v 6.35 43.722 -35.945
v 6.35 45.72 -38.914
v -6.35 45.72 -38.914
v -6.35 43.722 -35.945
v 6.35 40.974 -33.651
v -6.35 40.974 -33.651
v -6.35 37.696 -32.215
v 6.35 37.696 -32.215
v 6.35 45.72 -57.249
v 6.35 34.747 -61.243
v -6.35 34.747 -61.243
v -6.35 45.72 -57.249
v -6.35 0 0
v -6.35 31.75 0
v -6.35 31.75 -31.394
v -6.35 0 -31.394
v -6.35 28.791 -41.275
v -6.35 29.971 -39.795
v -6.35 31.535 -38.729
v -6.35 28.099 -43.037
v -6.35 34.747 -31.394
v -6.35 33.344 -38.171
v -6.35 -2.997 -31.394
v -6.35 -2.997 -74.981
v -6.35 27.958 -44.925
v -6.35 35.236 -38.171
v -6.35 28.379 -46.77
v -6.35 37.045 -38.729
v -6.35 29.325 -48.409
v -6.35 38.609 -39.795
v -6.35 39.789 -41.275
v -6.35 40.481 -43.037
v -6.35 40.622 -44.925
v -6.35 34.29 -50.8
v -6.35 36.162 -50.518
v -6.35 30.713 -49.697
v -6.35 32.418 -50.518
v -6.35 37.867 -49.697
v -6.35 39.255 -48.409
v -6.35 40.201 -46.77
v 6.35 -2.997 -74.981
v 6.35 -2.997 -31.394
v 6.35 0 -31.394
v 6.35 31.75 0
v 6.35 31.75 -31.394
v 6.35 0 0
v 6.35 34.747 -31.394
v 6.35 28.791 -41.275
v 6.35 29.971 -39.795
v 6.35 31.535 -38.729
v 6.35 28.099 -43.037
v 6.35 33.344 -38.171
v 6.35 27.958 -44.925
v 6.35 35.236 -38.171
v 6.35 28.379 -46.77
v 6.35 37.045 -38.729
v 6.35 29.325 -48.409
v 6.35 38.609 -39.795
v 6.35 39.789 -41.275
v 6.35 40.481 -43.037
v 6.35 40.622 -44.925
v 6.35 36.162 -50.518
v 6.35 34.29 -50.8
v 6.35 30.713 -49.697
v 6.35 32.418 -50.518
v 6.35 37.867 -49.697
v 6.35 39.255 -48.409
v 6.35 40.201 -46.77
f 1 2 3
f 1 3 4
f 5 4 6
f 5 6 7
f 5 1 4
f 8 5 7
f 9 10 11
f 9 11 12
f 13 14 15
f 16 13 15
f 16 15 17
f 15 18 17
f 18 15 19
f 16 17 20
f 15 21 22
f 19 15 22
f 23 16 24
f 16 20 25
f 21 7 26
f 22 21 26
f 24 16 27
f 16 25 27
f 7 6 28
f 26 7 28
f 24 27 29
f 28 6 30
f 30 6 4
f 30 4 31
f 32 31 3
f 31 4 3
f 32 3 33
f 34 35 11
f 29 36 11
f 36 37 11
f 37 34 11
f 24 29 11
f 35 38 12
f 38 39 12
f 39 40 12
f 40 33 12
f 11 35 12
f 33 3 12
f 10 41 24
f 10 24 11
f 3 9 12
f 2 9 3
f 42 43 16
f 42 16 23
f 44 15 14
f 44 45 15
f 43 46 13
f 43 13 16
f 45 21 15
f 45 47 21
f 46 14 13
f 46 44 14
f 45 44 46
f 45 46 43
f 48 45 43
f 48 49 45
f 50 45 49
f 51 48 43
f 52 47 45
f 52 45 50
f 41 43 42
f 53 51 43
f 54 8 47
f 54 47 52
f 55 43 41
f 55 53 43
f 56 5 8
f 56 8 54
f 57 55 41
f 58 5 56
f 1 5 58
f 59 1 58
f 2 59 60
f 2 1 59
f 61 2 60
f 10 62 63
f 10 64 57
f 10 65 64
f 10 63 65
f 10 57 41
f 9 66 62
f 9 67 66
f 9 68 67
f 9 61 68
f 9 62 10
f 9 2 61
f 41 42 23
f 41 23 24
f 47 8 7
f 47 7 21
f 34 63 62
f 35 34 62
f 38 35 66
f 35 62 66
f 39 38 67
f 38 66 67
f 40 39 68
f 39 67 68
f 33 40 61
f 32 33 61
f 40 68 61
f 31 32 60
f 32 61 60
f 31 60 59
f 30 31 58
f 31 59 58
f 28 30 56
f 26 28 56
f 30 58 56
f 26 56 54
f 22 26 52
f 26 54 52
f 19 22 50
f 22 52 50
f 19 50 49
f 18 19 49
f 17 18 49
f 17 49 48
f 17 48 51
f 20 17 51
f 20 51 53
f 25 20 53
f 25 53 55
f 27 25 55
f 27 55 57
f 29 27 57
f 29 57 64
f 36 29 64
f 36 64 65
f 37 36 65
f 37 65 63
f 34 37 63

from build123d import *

# Parameters (mm, degrees)
BOSS_EXTRUDE1_DEPTH = 6.35
BOSS_EXTRUDE2_DEPTH = 12.7
SKETCH5_R           = 6.35
CUT_EXTRUDE2_DEPTH  = 13.7


with BuildPart() as part:
    # Sketch2 → Boss-Extrude1 (new body, symmetric)
    with BuildSketch(Plane(origin=(0, 0, 0), x_dir=(0, 0, -1), z_dir=(1, 0, 0))):
        Polygon((0, 31.75), (0, 0), (31.3944, 0), (31.3944, -2.9972), (74.9808, -2.9972), (61.24296189, 34.7472), (31.3944, 34.7472), (31.3944, 31.75), align=None)
    extrude(amount=BOSS_EXTRUDE1_DEPTH, both=True)

    # Sketch4 → Boss-Extrude2 (add, through all)
    with BuildSketch(Plane(origin=(6.35, 0, 0), x_dir=(0, 0, -1), z_dir=(1, 0, 0))):
        with BuildLine():
            Line((57.141767732, 34.7472), (61.24296189, 34.7472))
            Line((61.24296189, 34.7472), (57.249189303, 45.72))
            Line((57.249189303, 45.72), (38.914198342, 45.72))
            ThreePointArc((38.914198342, 45.72), (34.700855885, 42.429053325), (32.215182454, 37.695765645))
            Line((32.215182454, 37.695765645), (31.3944, 34.7472))
            Line((31.3944, 34.7472), (31.758232268, 34.7472))
            ThreePointArc((31.758232268, 34.7472), (44.45, 21.59), (57.141767732, 34.7472))
        make_face()
    extrude(amount=-BOSS_EXTRUDE2_DEPTH)

    # Sketch5 → Cut-Extrude2 (cut, through all)
    with BuildSketch(Plane(origin=(6.35, 0, 0), x_dir=(0, 0, -1), z_dir=(1, 0, 0))):
        with Locations((44.45, 34.29)):
            Circle(SKETCH5_R)
    extrude(amount=-CUT_EXTRUDE2_DEPTH, mode=Mode.SUBTRACT)


solid = part.part
